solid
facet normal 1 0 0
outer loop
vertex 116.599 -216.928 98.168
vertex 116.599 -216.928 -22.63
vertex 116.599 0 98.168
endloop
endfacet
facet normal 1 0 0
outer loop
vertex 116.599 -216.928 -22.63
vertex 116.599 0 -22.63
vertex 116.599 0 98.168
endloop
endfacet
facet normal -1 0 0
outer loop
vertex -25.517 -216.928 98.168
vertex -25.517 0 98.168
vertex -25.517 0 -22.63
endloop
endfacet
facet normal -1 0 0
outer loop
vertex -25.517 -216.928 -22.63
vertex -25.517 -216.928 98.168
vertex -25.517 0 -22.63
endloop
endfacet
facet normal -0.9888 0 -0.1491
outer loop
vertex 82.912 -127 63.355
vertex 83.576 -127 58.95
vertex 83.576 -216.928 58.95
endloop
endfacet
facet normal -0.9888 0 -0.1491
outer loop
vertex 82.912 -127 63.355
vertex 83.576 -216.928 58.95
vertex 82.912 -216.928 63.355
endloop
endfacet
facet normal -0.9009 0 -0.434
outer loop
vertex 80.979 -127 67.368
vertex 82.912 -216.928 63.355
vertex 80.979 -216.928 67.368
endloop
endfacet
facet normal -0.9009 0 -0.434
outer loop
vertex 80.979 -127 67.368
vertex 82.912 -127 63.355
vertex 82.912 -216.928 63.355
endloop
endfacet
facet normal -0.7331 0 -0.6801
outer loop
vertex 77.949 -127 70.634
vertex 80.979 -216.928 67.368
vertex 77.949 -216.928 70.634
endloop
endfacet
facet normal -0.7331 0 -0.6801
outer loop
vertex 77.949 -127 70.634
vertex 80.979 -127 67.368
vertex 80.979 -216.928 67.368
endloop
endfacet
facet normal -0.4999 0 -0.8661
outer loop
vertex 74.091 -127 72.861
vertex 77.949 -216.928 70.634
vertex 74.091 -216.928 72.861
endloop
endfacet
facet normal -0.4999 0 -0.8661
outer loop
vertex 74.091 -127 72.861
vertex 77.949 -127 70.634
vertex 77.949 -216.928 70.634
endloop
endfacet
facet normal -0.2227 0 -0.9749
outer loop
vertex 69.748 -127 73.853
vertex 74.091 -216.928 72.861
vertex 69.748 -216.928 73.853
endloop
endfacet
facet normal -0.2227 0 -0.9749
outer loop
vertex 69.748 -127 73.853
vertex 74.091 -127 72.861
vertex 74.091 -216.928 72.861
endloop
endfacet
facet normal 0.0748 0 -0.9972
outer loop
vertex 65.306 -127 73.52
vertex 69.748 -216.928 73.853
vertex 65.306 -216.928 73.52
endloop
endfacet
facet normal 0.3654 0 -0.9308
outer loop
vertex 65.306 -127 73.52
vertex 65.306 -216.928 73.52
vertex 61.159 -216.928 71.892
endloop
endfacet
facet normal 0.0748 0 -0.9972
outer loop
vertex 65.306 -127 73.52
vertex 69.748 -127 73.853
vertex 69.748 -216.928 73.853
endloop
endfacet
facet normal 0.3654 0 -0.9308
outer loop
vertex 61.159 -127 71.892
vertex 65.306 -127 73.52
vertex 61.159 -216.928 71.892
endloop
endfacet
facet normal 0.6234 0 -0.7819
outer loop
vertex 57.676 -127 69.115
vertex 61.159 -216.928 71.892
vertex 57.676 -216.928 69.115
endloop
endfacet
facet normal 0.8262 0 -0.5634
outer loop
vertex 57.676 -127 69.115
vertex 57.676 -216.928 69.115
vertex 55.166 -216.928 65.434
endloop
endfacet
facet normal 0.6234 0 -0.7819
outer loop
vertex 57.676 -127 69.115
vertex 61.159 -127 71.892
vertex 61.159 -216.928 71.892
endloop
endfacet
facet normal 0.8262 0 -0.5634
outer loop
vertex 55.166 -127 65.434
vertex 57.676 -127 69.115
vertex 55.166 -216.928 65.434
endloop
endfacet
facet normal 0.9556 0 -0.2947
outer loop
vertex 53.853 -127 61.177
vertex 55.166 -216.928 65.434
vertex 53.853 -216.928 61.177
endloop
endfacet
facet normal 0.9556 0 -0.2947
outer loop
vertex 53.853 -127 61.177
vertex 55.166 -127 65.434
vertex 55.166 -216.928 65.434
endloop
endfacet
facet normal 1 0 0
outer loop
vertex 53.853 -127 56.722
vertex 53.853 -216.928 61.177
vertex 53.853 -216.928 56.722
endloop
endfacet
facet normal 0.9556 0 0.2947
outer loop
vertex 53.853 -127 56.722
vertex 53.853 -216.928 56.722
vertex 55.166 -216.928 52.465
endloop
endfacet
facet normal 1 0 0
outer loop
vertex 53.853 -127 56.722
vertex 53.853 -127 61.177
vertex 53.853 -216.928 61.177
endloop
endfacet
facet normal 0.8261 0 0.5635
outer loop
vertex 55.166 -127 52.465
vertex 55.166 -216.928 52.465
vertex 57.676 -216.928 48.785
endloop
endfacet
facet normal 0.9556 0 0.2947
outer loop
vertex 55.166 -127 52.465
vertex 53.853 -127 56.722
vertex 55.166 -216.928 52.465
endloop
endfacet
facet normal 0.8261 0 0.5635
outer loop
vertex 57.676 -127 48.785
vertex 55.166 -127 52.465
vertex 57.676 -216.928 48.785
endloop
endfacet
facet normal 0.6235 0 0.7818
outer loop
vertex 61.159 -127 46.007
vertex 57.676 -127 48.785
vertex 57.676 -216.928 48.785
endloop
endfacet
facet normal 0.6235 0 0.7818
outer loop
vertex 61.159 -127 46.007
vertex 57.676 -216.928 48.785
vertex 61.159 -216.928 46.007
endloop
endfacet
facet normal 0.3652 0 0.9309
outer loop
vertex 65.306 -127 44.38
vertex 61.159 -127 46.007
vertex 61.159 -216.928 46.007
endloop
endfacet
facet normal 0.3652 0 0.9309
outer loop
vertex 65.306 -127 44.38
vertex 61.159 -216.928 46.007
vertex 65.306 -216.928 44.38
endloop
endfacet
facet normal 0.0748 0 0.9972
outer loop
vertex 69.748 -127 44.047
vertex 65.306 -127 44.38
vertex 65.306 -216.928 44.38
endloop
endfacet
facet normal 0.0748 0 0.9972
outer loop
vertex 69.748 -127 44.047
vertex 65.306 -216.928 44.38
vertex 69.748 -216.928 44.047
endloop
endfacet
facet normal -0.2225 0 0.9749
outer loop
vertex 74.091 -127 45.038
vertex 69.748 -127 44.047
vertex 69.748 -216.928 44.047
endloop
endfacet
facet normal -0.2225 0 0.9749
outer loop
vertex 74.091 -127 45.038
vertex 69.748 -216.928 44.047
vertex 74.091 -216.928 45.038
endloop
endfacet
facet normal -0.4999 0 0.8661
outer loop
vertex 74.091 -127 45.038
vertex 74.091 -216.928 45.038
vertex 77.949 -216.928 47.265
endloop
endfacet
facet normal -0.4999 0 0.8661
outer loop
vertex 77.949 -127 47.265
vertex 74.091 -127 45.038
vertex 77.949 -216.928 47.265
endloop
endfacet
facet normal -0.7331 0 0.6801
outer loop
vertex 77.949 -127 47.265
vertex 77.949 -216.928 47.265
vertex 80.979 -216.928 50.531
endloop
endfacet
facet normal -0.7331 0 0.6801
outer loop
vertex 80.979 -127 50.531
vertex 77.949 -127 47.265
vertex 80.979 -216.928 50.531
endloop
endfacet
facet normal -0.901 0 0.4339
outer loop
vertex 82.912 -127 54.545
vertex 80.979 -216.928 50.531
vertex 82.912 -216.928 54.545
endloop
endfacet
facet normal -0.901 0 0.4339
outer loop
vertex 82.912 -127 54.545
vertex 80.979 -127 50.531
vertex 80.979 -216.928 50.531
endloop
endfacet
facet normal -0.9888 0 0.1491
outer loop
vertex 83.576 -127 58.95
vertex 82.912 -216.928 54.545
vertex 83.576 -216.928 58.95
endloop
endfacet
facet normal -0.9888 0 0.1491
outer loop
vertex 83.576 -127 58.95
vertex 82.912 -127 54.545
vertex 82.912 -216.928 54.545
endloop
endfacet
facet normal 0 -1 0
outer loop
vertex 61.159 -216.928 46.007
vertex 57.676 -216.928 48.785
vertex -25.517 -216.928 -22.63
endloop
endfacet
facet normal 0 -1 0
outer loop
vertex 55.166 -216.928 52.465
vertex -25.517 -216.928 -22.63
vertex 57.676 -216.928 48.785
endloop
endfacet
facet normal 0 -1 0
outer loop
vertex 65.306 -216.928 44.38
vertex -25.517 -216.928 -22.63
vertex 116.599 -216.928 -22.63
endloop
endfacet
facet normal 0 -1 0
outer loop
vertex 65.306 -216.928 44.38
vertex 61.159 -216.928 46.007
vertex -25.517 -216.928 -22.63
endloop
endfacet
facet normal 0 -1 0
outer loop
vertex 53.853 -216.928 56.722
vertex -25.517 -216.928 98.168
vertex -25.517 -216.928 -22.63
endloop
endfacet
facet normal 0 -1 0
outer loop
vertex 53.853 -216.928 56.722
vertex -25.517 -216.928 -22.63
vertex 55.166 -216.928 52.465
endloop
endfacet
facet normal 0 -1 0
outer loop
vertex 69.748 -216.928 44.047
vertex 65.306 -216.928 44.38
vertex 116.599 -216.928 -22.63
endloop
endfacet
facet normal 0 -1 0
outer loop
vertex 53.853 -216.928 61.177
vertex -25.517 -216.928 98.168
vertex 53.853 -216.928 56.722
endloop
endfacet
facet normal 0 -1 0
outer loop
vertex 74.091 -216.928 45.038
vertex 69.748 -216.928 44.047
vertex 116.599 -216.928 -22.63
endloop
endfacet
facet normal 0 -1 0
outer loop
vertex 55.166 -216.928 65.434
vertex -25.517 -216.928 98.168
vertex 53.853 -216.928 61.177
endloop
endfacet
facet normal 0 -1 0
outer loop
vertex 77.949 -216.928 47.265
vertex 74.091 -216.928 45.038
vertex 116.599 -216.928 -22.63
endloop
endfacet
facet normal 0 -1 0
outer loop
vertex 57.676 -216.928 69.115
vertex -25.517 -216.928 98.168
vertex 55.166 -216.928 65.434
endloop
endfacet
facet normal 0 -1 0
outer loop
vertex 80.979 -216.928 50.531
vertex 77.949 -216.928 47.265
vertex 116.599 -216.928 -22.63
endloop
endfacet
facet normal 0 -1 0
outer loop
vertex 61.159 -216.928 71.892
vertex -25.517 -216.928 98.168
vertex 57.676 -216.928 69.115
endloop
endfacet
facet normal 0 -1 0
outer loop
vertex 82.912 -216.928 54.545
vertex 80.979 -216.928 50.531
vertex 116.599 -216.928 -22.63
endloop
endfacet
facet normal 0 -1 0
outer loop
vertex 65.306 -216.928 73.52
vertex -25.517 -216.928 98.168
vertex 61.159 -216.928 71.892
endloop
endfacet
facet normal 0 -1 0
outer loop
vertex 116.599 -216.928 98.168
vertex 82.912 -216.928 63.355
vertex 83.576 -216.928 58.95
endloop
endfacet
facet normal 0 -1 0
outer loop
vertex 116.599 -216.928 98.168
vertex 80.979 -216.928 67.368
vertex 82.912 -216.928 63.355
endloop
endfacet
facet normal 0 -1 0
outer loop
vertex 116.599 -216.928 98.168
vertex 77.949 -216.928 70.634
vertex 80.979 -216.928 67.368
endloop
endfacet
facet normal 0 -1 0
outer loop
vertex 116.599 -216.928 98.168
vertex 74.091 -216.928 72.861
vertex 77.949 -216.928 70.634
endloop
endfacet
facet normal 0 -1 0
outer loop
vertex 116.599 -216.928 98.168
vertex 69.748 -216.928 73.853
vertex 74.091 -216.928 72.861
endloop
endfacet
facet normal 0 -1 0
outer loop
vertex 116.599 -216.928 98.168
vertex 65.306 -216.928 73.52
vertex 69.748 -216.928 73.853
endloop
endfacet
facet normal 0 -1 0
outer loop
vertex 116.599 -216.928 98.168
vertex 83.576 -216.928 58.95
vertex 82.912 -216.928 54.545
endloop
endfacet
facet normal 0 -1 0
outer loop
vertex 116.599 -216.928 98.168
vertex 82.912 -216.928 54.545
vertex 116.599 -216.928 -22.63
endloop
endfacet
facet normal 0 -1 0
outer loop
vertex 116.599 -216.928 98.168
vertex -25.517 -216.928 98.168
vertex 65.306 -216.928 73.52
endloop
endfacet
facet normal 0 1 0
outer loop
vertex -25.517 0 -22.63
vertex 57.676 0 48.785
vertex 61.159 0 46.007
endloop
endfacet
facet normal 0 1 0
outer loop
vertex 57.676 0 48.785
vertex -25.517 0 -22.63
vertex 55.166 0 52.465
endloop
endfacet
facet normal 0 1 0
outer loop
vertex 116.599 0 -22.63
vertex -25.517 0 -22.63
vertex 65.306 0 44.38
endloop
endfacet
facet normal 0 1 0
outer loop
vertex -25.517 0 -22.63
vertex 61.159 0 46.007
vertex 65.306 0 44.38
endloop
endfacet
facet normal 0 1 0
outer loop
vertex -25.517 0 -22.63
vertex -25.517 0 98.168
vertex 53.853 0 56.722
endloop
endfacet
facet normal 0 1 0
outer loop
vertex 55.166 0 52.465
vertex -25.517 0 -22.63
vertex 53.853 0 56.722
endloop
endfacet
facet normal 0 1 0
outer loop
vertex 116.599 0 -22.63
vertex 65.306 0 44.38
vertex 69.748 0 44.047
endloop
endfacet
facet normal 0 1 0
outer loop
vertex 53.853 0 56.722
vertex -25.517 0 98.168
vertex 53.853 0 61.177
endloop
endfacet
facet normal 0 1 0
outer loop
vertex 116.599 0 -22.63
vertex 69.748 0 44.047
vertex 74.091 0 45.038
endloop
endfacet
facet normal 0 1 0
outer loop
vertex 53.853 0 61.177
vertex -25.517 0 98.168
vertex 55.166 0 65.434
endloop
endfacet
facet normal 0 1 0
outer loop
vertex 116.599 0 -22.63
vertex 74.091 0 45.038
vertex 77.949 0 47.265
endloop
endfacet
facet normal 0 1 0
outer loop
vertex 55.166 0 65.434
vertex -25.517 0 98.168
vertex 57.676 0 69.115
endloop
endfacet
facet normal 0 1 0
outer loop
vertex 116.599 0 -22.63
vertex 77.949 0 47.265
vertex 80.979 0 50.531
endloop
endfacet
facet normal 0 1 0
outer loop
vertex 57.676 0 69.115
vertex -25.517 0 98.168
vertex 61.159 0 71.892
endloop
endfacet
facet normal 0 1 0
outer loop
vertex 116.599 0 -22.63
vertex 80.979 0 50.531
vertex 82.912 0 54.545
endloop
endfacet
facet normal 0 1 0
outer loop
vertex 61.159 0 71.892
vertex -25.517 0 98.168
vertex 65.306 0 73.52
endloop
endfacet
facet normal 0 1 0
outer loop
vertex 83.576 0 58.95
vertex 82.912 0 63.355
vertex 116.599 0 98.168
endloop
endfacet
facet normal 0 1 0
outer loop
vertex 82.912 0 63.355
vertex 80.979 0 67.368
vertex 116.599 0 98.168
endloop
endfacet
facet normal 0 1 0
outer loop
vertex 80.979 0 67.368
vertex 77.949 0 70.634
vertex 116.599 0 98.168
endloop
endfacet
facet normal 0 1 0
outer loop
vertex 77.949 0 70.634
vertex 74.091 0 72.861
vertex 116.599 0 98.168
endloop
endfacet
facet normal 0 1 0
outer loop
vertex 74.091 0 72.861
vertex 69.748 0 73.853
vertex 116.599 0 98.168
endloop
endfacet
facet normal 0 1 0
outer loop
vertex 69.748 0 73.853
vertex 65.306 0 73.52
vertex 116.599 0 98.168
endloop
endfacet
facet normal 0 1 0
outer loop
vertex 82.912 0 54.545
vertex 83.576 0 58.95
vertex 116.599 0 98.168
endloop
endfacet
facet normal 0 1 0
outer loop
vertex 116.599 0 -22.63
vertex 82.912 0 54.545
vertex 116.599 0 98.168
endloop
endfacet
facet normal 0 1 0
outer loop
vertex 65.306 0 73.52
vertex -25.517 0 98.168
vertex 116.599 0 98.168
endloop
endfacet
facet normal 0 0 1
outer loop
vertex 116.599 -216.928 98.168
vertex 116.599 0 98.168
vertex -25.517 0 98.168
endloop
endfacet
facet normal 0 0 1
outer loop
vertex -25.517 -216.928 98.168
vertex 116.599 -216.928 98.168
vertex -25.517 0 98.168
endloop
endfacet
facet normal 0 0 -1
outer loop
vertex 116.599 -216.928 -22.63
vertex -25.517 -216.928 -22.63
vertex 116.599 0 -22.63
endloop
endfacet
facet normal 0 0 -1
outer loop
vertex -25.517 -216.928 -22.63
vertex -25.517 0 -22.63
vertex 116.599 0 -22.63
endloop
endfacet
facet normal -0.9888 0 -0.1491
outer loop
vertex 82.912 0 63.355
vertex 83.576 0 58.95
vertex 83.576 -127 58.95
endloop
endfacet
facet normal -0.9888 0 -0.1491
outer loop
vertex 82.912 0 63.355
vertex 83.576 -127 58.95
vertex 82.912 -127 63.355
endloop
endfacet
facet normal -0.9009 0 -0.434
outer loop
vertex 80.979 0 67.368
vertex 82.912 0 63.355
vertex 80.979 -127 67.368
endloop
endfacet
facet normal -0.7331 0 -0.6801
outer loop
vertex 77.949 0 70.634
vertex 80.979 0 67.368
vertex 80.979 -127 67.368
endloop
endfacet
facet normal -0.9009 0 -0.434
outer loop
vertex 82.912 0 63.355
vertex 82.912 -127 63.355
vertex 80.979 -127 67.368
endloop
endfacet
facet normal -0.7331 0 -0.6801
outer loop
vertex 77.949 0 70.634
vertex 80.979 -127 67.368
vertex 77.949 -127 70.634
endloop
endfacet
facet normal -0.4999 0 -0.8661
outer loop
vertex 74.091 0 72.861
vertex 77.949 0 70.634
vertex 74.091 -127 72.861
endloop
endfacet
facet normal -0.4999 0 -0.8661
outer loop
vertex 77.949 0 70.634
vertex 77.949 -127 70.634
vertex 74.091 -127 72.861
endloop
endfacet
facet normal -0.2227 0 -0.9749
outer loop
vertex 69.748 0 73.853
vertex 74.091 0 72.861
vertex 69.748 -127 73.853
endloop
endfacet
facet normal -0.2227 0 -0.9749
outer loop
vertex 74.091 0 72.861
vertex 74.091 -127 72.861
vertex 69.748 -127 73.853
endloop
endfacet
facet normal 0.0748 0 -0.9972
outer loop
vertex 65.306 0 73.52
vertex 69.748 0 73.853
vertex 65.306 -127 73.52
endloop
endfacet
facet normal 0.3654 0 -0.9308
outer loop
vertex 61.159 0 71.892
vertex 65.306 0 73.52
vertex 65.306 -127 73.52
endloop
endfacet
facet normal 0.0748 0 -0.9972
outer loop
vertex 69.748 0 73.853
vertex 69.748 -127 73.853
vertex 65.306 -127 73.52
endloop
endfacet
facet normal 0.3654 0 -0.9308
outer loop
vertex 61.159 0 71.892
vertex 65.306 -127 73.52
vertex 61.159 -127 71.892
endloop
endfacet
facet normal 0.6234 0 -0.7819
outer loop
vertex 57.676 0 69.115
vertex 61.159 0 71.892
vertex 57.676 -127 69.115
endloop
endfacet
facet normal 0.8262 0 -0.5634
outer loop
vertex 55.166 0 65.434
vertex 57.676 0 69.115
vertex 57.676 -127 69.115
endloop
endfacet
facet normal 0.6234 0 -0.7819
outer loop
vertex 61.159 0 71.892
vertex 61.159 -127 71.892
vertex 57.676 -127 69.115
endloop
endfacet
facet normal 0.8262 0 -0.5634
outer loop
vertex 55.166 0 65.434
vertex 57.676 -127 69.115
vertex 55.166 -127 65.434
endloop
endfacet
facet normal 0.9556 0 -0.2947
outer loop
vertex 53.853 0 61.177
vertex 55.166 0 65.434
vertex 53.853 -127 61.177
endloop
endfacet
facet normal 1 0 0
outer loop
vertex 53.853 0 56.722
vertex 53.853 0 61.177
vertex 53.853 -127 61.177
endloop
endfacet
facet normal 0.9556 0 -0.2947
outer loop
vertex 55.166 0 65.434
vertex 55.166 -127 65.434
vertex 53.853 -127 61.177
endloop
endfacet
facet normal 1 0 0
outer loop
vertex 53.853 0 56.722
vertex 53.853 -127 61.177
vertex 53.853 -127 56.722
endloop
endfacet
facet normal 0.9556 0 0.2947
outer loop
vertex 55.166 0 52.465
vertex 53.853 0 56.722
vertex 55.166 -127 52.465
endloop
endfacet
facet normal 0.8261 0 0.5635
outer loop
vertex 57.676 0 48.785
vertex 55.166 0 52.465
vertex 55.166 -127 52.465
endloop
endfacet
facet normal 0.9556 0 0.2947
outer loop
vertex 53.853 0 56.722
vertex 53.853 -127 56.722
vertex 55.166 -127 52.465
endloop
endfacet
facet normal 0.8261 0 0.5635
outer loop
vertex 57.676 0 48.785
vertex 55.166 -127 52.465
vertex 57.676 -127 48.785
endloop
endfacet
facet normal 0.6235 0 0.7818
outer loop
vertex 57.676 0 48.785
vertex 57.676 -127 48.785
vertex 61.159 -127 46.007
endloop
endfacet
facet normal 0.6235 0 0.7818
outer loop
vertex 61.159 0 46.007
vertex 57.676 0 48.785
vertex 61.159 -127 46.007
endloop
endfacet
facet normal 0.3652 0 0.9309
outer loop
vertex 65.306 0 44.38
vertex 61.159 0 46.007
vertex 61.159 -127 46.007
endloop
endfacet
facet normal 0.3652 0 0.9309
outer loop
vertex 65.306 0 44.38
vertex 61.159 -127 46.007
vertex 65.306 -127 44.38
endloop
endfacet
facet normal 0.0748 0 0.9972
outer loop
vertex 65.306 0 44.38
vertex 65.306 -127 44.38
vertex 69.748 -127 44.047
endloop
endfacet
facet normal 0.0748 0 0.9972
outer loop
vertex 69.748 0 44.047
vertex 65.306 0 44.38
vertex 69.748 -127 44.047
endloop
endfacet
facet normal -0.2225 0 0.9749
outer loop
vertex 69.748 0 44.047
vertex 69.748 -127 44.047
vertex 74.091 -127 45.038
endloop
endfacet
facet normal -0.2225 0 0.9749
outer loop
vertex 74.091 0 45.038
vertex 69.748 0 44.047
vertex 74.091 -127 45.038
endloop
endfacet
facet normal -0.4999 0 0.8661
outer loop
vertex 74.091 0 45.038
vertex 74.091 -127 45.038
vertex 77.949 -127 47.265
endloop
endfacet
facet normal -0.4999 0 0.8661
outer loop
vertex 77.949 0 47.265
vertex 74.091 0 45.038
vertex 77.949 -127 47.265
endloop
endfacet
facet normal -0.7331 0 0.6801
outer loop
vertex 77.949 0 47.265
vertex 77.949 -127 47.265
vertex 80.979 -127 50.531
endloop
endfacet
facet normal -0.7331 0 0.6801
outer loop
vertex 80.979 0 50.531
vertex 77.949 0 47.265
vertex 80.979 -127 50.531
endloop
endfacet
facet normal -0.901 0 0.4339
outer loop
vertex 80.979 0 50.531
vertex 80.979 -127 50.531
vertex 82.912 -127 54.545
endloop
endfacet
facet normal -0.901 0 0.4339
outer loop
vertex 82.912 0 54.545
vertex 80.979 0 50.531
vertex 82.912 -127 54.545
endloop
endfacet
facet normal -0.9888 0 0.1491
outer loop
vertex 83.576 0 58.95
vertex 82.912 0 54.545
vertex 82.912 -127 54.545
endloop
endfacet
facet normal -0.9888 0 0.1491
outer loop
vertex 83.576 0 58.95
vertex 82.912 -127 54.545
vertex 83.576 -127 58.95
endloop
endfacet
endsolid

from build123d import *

# Parameters (mm, degrees)
F0_W     = 142.115966
F0_H     = 120.79817
F1_DEPTH = 127
F2_R     = 14.944743
F3_DEPTH = 127.001
F4_R     = 14.944743
F5_DEPTH = 89.927636


with BuildPart() as f1:
    # F0 (on Front) → F1 (new body)
    with BuildSketch(Plane.XZ):
        with Locations((45.540601, 37.768662)):
            Rectangle(F0_W, F0_H)
    extrude(amount=F1_DEPTH)

    # F2 (on face) → F3 (cut, through all)
    with BuildSketch(Plane.XZ.offset(127)):
        with Locations((68.631113, 58.949754)):
            Circle(F2_R)
    extrude(amount=-F3_DEPTH, mode=Mode.SUBTRACT)

    # F4 (on face) → F5 (join)
    with BuildSketch(Plane.XZ.offset(127)):
        with BuildLine():
            ThreePointArc((-25.517382, 25.873997), (3.077078, 45.820338), (26.239085, 19.762304))
            ThreePointArc((26.239085, 19.762304), (3.077078, -6.295731), (-25.517382, 13.650611))
            Line((-25.517382, 13.650611), (-25.517382, -22.630423))
            Line((-25.517382, -22.630423), (116.598584, -22.630423))
            Line((116.598584, -22.630423), (116.598584, 98.167747))
            Line((116.598584, 98.167747), (-25.517382, 98.167747))
            Line((-25.517382, 98.167747), (-25.517382, 25.873997))
        make_face()
        with Locations((68.631113, 58.949754)):
            Circle(F4_R, mode=Mode.SUBTRACT)
        with BuildLine():
            ThreePointArc((-25.517382, 13.650611), (3.077078, -6.295731), (26.239085, 19.762304))
            ThreePointArc((26.239085, 19.762304), (3.077078, 45.820338), (-25.517382, 25.873997))
            Line((-25.517382, 25.873997), (-25.517382, 13.650611))
        make_face()
    extrude(amount=F5_DEPTH)


solid = f1.part
